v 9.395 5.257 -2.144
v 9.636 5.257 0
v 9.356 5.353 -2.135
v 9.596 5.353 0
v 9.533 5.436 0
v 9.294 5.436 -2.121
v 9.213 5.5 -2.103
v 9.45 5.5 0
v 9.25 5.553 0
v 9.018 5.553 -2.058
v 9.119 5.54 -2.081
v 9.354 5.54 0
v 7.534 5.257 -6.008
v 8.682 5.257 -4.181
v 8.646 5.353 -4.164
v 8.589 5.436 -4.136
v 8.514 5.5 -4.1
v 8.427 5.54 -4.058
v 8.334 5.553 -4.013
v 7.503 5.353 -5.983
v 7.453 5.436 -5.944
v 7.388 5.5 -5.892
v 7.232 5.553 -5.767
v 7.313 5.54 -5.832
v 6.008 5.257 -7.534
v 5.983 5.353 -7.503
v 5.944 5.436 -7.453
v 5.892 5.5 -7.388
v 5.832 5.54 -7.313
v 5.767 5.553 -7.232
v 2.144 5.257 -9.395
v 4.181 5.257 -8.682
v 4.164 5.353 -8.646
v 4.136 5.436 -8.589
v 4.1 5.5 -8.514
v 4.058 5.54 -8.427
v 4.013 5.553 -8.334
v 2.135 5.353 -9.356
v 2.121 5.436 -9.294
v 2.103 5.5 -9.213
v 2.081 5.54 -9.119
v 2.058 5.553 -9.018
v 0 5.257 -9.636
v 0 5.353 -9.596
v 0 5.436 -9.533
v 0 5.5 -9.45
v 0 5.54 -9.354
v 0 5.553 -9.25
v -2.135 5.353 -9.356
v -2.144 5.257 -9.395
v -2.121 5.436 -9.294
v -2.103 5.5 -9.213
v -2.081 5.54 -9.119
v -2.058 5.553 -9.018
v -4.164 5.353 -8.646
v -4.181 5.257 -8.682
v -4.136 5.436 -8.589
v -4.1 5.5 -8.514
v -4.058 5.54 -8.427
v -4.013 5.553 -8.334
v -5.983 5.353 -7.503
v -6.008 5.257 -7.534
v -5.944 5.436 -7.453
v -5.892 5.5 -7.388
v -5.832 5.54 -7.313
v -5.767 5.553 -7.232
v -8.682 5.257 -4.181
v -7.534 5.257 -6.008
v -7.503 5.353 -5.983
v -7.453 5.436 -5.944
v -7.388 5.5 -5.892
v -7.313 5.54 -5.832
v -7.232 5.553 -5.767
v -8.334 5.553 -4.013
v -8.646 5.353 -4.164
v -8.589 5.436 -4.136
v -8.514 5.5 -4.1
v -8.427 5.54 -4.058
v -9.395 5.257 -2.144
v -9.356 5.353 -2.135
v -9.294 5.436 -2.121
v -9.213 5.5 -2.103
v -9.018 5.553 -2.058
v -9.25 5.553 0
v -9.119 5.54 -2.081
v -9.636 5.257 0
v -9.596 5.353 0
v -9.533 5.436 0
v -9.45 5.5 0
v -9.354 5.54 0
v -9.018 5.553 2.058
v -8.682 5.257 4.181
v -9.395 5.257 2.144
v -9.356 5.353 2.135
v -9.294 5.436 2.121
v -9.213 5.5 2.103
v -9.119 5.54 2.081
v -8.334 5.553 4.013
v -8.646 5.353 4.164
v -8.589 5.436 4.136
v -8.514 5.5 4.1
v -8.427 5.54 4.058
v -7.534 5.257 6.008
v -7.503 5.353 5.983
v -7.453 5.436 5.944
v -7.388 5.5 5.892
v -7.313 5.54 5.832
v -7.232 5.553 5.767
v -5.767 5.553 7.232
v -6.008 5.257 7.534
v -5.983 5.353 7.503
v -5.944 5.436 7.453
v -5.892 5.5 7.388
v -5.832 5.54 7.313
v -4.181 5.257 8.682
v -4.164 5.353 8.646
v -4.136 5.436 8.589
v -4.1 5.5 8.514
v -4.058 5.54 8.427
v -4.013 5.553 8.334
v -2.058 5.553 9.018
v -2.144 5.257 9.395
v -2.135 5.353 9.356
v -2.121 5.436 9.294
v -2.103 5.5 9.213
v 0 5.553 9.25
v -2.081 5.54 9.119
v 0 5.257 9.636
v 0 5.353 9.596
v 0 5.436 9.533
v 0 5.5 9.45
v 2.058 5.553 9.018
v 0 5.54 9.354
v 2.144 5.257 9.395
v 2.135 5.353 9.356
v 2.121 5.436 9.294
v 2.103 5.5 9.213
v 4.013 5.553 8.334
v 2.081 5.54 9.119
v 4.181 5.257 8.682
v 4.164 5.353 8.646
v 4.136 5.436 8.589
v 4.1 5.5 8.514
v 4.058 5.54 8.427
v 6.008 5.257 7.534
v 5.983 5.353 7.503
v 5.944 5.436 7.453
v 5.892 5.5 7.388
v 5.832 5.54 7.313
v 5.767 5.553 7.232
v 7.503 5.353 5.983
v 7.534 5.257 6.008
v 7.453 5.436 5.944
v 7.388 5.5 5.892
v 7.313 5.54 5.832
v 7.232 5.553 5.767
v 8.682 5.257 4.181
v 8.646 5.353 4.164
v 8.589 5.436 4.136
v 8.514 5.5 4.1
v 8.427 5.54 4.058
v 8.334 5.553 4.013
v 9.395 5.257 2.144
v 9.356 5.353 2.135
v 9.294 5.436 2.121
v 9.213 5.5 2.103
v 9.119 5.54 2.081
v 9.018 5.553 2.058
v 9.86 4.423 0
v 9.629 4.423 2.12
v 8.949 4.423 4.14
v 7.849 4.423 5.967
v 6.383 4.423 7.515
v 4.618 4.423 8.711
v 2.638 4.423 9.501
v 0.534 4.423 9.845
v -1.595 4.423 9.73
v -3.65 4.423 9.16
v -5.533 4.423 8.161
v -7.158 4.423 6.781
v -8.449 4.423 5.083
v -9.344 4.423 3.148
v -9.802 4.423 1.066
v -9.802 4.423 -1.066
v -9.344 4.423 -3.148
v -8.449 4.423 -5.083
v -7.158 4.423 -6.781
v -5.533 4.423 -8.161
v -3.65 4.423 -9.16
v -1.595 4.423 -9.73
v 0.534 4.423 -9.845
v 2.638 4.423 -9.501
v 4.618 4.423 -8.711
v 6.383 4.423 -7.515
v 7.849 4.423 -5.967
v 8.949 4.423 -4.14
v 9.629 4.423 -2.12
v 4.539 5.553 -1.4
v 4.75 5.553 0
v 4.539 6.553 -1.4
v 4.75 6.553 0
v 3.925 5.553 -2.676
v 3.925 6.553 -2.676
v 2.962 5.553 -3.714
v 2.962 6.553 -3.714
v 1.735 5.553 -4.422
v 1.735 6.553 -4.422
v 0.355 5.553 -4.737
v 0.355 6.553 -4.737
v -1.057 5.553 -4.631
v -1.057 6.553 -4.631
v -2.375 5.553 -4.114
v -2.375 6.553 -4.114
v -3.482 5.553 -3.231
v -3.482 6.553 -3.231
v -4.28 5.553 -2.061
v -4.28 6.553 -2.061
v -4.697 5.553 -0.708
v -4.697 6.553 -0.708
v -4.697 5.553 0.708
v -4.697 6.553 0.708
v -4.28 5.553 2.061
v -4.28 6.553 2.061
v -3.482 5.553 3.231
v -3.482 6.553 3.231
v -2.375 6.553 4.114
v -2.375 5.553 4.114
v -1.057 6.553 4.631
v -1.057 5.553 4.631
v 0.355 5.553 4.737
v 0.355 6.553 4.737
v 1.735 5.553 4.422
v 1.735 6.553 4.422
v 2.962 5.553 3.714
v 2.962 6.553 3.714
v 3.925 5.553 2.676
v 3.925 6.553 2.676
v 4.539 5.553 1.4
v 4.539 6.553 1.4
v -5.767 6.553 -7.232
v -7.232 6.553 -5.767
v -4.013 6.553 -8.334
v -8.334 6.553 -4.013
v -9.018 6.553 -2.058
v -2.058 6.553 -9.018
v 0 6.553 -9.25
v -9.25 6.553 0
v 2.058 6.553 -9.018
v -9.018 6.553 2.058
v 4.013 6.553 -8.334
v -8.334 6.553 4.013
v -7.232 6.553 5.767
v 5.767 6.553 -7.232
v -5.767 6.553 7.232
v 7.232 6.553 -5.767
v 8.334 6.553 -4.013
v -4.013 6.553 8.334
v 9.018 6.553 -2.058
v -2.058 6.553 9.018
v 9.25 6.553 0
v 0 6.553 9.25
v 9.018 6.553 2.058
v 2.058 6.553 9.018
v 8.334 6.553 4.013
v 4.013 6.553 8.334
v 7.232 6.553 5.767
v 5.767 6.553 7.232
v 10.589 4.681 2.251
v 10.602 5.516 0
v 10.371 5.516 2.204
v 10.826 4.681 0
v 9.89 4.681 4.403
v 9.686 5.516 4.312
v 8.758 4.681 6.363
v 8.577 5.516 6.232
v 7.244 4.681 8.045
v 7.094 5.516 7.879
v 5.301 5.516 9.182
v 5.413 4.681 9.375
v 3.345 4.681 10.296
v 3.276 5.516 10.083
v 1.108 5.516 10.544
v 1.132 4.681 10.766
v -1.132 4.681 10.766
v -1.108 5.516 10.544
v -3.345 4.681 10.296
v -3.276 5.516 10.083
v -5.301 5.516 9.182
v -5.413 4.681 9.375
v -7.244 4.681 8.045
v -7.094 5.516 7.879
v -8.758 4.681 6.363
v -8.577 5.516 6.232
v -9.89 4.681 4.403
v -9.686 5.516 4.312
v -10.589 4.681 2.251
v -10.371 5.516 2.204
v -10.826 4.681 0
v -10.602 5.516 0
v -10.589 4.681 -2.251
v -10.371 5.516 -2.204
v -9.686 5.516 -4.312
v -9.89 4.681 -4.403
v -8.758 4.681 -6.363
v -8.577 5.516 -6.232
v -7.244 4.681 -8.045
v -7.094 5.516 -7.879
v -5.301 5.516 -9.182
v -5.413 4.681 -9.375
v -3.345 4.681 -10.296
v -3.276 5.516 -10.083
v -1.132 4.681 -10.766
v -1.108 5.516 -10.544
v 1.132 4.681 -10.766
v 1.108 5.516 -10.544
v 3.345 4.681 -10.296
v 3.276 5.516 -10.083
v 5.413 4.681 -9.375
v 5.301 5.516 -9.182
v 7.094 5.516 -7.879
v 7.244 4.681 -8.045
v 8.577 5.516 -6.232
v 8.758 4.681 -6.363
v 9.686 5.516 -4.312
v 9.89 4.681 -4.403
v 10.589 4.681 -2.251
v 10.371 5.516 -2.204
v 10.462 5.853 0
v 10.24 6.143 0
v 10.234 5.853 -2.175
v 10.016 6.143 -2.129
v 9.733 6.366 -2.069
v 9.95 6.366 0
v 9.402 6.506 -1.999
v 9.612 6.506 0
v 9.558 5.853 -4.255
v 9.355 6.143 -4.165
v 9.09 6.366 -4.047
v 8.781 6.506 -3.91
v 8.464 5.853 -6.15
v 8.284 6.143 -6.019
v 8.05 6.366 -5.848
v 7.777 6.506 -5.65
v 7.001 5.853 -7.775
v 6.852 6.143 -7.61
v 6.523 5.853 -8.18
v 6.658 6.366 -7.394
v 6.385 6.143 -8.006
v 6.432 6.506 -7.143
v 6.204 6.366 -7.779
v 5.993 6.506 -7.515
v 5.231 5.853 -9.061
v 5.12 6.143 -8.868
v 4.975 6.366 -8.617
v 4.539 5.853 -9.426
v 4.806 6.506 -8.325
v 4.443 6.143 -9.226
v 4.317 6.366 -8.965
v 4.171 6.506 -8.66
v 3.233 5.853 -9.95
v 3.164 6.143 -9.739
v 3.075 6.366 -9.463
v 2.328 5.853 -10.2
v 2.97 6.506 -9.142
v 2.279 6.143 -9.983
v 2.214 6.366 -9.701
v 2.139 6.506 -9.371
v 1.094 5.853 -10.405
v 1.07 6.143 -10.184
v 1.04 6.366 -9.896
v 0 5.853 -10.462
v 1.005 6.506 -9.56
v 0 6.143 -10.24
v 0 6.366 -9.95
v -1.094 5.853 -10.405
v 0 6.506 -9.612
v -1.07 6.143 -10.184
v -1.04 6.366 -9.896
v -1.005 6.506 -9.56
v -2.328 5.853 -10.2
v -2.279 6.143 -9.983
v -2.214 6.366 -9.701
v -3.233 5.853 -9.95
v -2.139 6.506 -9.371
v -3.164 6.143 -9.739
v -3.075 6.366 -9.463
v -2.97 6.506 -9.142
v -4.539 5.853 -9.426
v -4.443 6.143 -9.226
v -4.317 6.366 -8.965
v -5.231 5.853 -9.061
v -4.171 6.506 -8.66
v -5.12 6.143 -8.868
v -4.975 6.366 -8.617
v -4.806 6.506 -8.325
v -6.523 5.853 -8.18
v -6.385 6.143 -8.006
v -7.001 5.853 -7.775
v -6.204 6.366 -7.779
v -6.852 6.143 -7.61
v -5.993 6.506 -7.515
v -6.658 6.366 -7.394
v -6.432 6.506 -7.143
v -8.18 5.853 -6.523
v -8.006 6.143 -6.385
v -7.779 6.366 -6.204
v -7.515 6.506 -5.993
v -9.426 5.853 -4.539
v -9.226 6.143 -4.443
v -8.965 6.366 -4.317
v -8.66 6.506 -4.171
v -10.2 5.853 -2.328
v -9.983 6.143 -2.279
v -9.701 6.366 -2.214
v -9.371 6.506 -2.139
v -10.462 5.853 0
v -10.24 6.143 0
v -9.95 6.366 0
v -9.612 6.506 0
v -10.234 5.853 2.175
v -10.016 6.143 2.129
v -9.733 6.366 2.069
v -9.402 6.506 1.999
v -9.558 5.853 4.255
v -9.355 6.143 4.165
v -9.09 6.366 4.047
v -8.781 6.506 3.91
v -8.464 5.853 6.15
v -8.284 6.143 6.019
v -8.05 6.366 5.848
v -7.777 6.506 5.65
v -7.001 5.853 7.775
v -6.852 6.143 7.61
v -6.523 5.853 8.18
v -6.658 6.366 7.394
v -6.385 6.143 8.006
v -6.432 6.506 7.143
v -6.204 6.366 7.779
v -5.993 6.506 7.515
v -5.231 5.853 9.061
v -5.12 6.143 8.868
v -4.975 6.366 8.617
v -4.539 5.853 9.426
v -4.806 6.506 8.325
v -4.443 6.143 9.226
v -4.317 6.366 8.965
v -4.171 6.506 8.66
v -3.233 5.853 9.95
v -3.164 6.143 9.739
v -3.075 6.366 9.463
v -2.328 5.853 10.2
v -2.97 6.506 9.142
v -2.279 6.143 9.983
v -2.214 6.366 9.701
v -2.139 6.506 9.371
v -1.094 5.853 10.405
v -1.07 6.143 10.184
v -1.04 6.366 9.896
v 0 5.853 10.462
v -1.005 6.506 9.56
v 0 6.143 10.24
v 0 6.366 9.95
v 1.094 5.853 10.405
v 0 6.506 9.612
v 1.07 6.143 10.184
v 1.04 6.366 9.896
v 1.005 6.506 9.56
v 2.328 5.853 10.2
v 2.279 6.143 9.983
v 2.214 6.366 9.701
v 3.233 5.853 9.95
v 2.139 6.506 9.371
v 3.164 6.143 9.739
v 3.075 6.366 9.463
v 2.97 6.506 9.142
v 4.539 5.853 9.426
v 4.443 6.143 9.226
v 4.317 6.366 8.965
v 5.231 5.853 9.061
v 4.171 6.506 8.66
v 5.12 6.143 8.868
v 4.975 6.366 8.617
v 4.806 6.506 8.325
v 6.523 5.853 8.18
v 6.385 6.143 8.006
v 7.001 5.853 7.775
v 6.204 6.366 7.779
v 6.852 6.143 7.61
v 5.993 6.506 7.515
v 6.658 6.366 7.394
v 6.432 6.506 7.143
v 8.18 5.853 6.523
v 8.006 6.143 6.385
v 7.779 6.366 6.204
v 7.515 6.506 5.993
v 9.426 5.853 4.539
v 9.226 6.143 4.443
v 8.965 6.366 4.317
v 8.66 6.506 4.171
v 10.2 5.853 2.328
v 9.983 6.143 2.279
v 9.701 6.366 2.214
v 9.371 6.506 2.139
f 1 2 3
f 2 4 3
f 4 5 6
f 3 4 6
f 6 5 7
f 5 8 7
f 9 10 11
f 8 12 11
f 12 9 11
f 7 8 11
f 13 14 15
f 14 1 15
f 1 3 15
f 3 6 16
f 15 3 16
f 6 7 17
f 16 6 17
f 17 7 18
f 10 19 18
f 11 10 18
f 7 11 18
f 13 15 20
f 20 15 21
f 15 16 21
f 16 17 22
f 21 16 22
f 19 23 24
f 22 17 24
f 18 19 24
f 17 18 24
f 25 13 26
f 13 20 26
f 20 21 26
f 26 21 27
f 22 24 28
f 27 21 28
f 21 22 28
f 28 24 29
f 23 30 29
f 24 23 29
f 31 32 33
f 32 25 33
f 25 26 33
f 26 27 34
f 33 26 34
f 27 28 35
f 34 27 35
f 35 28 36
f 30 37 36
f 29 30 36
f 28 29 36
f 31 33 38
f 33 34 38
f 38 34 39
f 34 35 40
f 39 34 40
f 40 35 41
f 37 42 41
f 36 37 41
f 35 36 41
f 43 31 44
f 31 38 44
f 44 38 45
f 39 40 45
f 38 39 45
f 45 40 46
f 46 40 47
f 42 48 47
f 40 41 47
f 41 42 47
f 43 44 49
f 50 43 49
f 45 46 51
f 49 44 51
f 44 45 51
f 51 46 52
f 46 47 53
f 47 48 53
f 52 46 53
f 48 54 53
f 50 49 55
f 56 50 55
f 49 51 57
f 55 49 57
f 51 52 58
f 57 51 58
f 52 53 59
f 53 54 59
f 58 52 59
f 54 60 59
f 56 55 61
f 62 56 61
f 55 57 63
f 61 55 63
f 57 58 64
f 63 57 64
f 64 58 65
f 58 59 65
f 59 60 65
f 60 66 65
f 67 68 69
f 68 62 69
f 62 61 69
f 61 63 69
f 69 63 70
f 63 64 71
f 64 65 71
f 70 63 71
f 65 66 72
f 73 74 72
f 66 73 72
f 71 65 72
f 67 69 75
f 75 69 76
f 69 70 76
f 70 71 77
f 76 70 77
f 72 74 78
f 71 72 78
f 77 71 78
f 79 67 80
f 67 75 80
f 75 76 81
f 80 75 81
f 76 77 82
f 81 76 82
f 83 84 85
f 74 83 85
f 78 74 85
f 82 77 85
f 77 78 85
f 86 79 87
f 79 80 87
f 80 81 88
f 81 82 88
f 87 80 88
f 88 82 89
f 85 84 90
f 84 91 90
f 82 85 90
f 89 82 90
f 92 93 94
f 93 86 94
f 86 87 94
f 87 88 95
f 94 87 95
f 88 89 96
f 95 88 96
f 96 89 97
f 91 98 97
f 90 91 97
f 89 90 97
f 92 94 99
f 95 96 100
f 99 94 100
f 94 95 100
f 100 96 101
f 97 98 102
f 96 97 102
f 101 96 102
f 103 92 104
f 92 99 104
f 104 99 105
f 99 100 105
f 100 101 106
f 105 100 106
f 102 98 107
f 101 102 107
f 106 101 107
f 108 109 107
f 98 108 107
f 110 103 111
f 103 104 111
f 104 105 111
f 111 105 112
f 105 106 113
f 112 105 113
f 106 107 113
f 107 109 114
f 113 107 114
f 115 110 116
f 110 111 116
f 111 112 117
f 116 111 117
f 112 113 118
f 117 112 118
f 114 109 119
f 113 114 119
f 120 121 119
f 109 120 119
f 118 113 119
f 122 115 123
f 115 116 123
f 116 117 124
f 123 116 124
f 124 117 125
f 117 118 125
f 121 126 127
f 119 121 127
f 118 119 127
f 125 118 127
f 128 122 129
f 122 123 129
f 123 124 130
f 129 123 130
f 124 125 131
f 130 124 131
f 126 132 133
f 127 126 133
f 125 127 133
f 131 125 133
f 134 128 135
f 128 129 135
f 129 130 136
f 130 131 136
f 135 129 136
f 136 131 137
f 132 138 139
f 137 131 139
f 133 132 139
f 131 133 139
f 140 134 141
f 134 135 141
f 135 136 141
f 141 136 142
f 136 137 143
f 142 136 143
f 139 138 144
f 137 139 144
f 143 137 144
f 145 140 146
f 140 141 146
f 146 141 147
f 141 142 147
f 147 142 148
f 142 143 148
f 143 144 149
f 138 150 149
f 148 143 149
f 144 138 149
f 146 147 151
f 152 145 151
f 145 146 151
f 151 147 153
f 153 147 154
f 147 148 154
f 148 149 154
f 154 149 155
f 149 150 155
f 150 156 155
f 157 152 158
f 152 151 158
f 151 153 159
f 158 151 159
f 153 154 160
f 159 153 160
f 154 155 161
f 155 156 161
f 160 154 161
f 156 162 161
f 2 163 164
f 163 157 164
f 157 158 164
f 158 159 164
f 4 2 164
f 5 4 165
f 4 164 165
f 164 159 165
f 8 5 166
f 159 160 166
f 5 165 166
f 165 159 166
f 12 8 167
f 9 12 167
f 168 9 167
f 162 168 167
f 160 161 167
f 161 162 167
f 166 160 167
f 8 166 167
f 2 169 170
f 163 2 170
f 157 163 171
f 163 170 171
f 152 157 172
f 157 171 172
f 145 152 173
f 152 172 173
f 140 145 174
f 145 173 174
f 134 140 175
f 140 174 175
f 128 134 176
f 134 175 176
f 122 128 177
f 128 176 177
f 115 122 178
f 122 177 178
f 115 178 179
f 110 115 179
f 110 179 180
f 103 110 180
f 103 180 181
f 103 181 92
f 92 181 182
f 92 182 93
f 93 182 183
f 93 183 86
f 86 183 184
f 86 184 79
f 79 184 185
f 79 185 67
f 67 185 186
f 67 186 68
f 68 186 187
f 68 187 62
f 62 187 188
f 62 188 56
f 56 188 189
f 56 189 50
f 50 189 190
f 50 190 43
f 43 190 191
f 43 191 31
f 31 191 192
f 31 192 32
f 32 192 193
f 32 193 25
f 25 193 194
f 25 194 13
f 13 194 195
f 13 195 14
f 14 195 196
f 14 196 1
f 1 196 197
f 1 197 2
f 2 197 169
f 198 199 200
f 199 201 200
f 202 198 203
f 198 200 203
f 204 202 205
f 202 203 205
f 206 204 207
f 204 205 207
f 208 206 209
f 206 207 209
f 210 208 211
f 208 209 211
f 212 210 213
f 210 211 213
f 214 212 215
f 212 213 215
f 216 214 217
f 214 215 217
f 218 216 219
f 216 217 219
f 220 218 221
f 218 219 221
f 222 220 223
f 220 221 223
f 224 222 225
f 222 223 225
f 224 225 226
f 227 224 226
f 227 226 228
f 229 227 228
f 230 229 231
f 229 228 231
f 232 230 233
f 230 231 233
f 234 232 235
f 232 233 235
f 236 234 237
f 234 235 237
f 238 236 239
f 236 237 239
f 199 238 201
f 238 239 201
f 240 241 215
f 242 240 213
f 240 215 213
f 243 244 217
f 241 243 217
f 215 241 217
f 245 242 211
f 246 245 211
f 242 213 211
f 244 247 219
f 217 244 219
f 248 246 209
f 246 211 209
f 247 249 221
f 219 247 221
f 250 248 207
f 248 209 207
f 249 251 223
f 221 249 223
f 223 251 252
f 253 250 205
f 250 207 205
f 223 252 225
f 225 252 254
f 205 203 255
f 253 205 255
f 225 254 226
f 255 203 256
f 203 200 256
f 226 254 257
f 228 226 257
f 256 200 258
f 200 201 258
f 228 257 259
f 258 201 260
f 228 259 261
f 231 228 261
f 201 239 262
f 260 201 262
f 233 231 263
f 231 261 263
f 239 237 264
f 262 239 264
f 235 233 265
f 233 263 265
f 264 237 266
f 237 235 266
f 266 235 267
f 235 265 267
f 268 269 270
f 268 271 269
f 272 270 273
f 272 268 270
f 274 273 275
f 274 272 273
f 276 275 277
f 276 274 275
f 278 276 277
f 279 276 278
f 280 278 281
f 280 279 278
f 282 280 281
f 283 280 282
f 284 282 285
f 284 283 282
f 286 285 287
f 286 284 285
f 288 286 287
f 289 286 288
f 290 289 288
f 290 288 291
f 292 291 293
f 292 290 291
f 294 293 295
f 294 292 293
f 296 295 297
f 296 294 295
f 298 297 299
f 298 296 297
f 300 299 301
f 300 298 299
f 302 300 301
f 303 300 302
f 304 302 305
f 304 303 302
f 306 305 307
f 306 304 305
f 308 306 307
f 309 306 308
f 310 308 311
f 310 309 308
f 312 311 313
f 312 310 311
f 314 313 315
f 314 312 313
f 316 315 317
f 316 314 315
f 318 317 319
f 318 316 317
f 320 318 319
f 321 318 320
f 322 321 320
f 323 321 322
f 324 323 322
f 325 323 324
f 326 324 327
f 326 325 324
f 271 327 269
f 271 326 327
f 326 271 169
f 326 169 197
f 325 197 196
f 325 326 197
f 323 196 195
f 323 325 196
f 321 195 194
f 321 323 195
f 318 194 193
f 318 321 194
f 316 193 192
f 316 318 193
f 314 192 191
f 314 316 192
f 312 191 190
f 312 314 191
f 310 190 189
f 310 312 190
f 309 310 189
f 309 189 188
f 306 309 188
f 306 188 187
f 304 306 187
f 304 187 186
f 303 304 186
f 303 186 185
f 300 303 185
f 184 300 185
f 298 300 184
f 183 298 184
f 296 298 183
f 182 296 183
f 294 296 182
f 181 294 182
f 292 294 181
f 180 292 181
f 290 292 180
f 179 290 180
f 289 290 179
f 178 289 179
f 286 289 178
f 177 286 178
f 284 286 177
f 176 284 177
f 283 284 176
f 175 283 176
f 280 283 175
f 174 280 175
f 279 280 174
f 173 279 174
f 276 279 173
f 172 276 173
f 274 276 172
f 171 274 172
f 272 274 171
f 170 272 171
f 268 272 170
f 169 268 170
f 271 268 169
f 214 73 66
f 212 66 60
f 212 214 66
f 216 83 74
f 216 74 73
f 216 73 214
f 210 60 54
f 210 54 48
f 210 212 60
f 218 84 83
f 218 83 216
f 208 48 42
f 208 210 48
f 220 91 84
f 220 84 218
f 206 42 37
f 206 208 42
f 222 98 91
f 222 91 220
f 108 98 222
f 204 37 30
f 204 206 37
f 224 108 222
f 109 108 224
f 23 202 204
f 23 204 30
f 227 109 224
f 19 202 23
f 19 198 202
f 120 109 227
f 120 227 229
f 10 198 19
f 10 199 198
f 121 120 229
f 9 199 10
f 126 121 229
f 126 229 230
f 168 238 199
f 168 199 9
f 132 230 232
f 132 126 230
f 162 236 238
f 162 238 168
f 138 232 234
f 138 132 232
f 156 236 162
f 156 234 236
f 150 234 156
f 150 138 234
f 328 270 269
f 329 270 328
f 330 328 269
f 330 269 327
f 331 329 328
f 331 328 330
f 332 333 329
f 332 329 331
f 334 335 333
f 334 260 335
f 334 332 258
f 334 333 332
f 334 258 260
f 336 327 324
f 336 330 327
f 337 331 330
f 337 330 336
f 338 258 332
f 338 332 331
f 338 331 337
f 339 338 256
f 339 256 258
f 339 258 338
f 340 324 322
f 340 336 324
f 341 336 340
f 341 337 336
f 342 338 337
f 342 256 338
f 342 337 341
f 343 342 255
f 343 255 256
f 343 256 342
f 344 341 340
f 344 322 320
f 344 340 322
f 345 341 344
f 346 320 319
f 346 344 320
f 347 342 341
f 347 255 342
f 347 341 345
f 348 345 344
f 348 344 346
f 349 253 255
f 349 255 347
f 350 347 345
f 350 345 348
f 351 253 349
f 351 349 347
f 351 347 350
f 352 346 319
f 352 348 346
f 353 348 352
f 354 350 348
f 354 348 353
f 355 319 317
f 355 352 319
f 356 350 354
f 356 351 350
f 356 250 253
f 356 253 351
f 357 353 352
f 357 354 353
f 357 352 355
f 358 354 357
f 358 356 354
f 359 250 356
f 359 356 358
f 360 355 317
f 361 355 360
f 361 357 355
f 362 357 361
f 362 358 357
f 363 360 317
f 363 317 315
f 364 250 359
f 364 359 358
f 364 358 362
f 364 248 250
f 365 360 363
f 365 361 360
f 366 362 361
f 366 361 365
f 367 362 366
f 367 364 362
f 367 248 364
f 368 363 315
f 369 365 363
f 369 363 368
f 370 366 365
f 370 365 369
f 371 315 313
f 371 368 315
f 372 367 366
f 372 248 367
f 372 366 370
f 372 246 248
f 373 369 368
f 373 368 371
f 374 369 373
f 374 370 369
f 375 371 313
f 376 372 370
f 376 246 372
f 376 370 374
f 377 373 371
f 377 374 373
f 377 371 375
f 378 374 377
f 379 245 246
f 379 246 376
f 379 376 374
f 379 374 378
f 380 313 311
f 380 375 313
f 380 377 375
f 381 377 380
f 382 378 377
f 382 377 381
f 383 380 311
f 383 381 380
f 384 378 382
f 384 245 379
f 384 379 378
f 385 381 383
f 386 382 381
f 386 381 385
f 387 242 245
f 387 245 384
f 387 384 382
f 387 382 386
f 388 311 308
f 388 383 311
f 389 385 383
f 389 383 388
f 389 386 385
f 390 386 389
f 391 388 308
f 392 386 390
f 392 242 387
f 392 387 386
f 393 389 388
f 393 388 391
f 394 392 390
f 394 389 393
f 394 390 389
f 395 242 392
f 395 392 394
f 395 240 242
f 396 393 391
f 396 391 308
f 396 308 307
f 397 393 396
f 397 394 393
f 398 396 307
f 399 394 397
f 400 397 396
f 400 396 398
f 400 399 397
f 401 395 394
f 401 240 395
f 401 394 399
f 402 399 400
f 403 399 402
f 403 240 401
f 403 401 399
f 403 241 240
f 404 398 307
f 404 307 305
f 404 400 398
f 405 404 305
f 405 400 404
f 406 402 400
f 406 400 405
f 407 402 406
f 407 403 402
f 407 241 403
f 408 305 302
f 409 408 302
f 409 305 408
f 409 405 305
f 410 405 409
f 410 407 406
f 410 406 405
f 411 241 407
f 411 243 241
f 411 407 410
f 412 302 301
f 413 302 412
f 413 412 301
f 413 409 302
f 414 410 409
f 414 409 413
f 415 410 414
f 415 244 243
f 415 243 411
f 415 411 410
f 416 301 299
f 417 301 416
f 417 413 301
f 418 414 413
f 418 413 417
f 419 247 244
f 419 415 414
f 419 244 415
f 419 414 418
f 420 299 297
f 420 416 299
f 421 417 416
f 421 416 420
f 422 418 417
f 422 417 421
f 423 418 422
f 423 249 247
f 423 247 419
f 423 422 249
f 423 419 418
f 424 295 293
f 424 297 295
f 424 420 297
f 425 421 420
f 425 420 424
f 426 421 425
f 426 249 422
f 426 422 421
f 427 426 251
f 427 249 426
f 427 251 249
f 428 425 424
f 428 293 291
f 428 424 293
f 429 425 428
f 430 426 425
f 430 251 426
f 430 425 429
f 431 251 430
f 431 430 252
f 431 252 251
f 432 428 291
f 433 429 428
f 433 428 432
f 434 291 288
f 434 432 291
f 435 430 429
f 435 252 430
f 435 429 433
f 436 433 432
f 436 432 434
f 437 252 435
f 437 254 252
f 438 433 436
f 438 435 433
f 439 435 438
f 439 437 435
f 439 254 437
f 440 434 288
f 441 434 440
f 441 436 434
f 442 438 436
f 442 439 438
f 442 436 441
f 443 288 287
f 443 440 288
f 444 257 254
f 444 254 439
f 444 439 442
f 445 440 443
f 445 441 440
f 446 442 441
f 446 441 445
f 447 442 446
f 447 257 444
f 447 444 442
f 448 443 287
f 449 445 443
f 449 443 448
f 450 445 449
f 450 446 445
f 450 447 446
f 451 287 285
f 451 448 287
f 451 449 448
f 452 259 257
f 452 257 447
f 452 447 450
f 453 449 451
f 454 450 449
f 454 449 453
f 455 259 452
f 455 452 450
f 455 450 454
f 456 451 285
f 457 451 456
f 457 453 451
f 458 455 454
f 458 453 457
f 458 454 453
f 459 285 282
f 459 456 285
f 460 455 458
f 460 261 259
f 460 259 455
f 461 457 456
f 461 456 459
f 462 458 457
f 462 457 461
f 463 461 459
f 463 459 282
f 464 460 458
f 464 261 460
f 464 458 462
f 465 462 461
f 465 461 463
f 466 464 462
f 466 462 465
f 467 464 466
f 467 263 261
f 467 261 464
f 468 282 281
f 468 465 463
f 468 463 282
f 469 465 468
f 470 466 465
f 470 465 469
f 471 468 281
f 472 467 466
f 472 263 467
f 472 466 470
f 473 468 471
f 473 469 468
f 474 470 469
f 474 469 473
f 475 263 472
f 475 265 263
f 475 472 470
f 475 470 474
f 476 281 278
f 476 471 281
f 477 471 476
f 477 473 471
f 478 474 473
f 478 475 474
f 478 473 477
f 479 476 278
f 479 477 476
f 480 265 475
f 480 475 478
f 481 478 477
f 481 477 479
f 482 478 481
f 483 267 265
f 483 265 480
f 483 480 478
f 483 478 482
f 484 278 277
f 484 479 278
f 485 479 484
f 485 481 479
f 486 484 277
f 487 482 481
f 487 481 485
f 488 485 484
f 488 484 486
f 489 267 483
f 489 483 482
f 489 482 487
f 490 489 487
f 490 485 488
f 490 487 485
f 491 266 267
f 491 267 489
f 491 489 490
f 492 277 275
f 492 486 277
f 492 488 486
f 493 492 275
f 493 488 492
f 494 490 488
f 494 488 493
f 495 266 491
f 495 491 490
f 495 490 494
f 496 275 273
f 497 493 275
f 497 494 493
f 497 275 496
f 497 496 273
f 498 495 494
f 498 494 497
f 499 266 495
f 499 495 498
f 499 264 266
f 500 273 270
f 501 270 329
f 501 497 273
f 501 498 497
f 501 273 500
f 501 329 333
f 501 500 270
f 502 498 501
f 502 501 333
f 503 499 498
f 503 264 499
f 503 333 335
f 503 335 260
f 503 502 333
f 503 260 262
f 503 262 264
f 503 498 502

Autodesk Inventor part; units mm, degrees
ref_plane "YZ Plane" through (0, 0, 0) normal (1, 0, 0) x (0, 1, 0)
ref_plane "XZ Plane" through (0, 0, 0) normal (0, 1, 0) x (-1, 0, 0)
ref_plane "XY Plane" through (0, 0, 0) normal (0, 0, 1) x (1, 0, 0)
sketch "Schizzo1" plane through (0, 0, 0) normal (0, 0, 1) x (1, 0, 0)
  line L0 (4.75, 6.5534) -> (9.25, 6.5534)
  arc A0 (10.6023, 5.5157) -> (9.25, 6.5534) centre (9.25, 5.1534) ccw
  line L1 (4.75, 5.5534) -> (9.25, 5.5534)
  line L2 (4.75, 5.5534) -> (4.75, 6.5534)
  line L3 (0, 6.5534) -> (0, 3.993) construction
  arc A1 (9.6364, 5.2569) -> (9.25, 5.5534) centre (9.25, 5.1534) ccw
  line L4 (9.8599, 4.4226) -> (10.8258, 4.6814)
  line L5 (10.6023, 5.5157) -> (10.8258, 4.6814)
  line L6 (9.8599, 4.4226) -> (9.6364, 5.2569)
  point P0 (0, 0)
  dimension "d1" = 4.5
  dimension "d2" = 1
  dimension "d8" = 4.75
  dimension "d10" = 0.4
  dimension "d11" = 9.25
revolve "Rivoluzione1" add sketch "Schizzo1" angle 360 about axis through (0, 6.5534, 0) along (0, -1, 0)
properties part number "Rondella superiore"
